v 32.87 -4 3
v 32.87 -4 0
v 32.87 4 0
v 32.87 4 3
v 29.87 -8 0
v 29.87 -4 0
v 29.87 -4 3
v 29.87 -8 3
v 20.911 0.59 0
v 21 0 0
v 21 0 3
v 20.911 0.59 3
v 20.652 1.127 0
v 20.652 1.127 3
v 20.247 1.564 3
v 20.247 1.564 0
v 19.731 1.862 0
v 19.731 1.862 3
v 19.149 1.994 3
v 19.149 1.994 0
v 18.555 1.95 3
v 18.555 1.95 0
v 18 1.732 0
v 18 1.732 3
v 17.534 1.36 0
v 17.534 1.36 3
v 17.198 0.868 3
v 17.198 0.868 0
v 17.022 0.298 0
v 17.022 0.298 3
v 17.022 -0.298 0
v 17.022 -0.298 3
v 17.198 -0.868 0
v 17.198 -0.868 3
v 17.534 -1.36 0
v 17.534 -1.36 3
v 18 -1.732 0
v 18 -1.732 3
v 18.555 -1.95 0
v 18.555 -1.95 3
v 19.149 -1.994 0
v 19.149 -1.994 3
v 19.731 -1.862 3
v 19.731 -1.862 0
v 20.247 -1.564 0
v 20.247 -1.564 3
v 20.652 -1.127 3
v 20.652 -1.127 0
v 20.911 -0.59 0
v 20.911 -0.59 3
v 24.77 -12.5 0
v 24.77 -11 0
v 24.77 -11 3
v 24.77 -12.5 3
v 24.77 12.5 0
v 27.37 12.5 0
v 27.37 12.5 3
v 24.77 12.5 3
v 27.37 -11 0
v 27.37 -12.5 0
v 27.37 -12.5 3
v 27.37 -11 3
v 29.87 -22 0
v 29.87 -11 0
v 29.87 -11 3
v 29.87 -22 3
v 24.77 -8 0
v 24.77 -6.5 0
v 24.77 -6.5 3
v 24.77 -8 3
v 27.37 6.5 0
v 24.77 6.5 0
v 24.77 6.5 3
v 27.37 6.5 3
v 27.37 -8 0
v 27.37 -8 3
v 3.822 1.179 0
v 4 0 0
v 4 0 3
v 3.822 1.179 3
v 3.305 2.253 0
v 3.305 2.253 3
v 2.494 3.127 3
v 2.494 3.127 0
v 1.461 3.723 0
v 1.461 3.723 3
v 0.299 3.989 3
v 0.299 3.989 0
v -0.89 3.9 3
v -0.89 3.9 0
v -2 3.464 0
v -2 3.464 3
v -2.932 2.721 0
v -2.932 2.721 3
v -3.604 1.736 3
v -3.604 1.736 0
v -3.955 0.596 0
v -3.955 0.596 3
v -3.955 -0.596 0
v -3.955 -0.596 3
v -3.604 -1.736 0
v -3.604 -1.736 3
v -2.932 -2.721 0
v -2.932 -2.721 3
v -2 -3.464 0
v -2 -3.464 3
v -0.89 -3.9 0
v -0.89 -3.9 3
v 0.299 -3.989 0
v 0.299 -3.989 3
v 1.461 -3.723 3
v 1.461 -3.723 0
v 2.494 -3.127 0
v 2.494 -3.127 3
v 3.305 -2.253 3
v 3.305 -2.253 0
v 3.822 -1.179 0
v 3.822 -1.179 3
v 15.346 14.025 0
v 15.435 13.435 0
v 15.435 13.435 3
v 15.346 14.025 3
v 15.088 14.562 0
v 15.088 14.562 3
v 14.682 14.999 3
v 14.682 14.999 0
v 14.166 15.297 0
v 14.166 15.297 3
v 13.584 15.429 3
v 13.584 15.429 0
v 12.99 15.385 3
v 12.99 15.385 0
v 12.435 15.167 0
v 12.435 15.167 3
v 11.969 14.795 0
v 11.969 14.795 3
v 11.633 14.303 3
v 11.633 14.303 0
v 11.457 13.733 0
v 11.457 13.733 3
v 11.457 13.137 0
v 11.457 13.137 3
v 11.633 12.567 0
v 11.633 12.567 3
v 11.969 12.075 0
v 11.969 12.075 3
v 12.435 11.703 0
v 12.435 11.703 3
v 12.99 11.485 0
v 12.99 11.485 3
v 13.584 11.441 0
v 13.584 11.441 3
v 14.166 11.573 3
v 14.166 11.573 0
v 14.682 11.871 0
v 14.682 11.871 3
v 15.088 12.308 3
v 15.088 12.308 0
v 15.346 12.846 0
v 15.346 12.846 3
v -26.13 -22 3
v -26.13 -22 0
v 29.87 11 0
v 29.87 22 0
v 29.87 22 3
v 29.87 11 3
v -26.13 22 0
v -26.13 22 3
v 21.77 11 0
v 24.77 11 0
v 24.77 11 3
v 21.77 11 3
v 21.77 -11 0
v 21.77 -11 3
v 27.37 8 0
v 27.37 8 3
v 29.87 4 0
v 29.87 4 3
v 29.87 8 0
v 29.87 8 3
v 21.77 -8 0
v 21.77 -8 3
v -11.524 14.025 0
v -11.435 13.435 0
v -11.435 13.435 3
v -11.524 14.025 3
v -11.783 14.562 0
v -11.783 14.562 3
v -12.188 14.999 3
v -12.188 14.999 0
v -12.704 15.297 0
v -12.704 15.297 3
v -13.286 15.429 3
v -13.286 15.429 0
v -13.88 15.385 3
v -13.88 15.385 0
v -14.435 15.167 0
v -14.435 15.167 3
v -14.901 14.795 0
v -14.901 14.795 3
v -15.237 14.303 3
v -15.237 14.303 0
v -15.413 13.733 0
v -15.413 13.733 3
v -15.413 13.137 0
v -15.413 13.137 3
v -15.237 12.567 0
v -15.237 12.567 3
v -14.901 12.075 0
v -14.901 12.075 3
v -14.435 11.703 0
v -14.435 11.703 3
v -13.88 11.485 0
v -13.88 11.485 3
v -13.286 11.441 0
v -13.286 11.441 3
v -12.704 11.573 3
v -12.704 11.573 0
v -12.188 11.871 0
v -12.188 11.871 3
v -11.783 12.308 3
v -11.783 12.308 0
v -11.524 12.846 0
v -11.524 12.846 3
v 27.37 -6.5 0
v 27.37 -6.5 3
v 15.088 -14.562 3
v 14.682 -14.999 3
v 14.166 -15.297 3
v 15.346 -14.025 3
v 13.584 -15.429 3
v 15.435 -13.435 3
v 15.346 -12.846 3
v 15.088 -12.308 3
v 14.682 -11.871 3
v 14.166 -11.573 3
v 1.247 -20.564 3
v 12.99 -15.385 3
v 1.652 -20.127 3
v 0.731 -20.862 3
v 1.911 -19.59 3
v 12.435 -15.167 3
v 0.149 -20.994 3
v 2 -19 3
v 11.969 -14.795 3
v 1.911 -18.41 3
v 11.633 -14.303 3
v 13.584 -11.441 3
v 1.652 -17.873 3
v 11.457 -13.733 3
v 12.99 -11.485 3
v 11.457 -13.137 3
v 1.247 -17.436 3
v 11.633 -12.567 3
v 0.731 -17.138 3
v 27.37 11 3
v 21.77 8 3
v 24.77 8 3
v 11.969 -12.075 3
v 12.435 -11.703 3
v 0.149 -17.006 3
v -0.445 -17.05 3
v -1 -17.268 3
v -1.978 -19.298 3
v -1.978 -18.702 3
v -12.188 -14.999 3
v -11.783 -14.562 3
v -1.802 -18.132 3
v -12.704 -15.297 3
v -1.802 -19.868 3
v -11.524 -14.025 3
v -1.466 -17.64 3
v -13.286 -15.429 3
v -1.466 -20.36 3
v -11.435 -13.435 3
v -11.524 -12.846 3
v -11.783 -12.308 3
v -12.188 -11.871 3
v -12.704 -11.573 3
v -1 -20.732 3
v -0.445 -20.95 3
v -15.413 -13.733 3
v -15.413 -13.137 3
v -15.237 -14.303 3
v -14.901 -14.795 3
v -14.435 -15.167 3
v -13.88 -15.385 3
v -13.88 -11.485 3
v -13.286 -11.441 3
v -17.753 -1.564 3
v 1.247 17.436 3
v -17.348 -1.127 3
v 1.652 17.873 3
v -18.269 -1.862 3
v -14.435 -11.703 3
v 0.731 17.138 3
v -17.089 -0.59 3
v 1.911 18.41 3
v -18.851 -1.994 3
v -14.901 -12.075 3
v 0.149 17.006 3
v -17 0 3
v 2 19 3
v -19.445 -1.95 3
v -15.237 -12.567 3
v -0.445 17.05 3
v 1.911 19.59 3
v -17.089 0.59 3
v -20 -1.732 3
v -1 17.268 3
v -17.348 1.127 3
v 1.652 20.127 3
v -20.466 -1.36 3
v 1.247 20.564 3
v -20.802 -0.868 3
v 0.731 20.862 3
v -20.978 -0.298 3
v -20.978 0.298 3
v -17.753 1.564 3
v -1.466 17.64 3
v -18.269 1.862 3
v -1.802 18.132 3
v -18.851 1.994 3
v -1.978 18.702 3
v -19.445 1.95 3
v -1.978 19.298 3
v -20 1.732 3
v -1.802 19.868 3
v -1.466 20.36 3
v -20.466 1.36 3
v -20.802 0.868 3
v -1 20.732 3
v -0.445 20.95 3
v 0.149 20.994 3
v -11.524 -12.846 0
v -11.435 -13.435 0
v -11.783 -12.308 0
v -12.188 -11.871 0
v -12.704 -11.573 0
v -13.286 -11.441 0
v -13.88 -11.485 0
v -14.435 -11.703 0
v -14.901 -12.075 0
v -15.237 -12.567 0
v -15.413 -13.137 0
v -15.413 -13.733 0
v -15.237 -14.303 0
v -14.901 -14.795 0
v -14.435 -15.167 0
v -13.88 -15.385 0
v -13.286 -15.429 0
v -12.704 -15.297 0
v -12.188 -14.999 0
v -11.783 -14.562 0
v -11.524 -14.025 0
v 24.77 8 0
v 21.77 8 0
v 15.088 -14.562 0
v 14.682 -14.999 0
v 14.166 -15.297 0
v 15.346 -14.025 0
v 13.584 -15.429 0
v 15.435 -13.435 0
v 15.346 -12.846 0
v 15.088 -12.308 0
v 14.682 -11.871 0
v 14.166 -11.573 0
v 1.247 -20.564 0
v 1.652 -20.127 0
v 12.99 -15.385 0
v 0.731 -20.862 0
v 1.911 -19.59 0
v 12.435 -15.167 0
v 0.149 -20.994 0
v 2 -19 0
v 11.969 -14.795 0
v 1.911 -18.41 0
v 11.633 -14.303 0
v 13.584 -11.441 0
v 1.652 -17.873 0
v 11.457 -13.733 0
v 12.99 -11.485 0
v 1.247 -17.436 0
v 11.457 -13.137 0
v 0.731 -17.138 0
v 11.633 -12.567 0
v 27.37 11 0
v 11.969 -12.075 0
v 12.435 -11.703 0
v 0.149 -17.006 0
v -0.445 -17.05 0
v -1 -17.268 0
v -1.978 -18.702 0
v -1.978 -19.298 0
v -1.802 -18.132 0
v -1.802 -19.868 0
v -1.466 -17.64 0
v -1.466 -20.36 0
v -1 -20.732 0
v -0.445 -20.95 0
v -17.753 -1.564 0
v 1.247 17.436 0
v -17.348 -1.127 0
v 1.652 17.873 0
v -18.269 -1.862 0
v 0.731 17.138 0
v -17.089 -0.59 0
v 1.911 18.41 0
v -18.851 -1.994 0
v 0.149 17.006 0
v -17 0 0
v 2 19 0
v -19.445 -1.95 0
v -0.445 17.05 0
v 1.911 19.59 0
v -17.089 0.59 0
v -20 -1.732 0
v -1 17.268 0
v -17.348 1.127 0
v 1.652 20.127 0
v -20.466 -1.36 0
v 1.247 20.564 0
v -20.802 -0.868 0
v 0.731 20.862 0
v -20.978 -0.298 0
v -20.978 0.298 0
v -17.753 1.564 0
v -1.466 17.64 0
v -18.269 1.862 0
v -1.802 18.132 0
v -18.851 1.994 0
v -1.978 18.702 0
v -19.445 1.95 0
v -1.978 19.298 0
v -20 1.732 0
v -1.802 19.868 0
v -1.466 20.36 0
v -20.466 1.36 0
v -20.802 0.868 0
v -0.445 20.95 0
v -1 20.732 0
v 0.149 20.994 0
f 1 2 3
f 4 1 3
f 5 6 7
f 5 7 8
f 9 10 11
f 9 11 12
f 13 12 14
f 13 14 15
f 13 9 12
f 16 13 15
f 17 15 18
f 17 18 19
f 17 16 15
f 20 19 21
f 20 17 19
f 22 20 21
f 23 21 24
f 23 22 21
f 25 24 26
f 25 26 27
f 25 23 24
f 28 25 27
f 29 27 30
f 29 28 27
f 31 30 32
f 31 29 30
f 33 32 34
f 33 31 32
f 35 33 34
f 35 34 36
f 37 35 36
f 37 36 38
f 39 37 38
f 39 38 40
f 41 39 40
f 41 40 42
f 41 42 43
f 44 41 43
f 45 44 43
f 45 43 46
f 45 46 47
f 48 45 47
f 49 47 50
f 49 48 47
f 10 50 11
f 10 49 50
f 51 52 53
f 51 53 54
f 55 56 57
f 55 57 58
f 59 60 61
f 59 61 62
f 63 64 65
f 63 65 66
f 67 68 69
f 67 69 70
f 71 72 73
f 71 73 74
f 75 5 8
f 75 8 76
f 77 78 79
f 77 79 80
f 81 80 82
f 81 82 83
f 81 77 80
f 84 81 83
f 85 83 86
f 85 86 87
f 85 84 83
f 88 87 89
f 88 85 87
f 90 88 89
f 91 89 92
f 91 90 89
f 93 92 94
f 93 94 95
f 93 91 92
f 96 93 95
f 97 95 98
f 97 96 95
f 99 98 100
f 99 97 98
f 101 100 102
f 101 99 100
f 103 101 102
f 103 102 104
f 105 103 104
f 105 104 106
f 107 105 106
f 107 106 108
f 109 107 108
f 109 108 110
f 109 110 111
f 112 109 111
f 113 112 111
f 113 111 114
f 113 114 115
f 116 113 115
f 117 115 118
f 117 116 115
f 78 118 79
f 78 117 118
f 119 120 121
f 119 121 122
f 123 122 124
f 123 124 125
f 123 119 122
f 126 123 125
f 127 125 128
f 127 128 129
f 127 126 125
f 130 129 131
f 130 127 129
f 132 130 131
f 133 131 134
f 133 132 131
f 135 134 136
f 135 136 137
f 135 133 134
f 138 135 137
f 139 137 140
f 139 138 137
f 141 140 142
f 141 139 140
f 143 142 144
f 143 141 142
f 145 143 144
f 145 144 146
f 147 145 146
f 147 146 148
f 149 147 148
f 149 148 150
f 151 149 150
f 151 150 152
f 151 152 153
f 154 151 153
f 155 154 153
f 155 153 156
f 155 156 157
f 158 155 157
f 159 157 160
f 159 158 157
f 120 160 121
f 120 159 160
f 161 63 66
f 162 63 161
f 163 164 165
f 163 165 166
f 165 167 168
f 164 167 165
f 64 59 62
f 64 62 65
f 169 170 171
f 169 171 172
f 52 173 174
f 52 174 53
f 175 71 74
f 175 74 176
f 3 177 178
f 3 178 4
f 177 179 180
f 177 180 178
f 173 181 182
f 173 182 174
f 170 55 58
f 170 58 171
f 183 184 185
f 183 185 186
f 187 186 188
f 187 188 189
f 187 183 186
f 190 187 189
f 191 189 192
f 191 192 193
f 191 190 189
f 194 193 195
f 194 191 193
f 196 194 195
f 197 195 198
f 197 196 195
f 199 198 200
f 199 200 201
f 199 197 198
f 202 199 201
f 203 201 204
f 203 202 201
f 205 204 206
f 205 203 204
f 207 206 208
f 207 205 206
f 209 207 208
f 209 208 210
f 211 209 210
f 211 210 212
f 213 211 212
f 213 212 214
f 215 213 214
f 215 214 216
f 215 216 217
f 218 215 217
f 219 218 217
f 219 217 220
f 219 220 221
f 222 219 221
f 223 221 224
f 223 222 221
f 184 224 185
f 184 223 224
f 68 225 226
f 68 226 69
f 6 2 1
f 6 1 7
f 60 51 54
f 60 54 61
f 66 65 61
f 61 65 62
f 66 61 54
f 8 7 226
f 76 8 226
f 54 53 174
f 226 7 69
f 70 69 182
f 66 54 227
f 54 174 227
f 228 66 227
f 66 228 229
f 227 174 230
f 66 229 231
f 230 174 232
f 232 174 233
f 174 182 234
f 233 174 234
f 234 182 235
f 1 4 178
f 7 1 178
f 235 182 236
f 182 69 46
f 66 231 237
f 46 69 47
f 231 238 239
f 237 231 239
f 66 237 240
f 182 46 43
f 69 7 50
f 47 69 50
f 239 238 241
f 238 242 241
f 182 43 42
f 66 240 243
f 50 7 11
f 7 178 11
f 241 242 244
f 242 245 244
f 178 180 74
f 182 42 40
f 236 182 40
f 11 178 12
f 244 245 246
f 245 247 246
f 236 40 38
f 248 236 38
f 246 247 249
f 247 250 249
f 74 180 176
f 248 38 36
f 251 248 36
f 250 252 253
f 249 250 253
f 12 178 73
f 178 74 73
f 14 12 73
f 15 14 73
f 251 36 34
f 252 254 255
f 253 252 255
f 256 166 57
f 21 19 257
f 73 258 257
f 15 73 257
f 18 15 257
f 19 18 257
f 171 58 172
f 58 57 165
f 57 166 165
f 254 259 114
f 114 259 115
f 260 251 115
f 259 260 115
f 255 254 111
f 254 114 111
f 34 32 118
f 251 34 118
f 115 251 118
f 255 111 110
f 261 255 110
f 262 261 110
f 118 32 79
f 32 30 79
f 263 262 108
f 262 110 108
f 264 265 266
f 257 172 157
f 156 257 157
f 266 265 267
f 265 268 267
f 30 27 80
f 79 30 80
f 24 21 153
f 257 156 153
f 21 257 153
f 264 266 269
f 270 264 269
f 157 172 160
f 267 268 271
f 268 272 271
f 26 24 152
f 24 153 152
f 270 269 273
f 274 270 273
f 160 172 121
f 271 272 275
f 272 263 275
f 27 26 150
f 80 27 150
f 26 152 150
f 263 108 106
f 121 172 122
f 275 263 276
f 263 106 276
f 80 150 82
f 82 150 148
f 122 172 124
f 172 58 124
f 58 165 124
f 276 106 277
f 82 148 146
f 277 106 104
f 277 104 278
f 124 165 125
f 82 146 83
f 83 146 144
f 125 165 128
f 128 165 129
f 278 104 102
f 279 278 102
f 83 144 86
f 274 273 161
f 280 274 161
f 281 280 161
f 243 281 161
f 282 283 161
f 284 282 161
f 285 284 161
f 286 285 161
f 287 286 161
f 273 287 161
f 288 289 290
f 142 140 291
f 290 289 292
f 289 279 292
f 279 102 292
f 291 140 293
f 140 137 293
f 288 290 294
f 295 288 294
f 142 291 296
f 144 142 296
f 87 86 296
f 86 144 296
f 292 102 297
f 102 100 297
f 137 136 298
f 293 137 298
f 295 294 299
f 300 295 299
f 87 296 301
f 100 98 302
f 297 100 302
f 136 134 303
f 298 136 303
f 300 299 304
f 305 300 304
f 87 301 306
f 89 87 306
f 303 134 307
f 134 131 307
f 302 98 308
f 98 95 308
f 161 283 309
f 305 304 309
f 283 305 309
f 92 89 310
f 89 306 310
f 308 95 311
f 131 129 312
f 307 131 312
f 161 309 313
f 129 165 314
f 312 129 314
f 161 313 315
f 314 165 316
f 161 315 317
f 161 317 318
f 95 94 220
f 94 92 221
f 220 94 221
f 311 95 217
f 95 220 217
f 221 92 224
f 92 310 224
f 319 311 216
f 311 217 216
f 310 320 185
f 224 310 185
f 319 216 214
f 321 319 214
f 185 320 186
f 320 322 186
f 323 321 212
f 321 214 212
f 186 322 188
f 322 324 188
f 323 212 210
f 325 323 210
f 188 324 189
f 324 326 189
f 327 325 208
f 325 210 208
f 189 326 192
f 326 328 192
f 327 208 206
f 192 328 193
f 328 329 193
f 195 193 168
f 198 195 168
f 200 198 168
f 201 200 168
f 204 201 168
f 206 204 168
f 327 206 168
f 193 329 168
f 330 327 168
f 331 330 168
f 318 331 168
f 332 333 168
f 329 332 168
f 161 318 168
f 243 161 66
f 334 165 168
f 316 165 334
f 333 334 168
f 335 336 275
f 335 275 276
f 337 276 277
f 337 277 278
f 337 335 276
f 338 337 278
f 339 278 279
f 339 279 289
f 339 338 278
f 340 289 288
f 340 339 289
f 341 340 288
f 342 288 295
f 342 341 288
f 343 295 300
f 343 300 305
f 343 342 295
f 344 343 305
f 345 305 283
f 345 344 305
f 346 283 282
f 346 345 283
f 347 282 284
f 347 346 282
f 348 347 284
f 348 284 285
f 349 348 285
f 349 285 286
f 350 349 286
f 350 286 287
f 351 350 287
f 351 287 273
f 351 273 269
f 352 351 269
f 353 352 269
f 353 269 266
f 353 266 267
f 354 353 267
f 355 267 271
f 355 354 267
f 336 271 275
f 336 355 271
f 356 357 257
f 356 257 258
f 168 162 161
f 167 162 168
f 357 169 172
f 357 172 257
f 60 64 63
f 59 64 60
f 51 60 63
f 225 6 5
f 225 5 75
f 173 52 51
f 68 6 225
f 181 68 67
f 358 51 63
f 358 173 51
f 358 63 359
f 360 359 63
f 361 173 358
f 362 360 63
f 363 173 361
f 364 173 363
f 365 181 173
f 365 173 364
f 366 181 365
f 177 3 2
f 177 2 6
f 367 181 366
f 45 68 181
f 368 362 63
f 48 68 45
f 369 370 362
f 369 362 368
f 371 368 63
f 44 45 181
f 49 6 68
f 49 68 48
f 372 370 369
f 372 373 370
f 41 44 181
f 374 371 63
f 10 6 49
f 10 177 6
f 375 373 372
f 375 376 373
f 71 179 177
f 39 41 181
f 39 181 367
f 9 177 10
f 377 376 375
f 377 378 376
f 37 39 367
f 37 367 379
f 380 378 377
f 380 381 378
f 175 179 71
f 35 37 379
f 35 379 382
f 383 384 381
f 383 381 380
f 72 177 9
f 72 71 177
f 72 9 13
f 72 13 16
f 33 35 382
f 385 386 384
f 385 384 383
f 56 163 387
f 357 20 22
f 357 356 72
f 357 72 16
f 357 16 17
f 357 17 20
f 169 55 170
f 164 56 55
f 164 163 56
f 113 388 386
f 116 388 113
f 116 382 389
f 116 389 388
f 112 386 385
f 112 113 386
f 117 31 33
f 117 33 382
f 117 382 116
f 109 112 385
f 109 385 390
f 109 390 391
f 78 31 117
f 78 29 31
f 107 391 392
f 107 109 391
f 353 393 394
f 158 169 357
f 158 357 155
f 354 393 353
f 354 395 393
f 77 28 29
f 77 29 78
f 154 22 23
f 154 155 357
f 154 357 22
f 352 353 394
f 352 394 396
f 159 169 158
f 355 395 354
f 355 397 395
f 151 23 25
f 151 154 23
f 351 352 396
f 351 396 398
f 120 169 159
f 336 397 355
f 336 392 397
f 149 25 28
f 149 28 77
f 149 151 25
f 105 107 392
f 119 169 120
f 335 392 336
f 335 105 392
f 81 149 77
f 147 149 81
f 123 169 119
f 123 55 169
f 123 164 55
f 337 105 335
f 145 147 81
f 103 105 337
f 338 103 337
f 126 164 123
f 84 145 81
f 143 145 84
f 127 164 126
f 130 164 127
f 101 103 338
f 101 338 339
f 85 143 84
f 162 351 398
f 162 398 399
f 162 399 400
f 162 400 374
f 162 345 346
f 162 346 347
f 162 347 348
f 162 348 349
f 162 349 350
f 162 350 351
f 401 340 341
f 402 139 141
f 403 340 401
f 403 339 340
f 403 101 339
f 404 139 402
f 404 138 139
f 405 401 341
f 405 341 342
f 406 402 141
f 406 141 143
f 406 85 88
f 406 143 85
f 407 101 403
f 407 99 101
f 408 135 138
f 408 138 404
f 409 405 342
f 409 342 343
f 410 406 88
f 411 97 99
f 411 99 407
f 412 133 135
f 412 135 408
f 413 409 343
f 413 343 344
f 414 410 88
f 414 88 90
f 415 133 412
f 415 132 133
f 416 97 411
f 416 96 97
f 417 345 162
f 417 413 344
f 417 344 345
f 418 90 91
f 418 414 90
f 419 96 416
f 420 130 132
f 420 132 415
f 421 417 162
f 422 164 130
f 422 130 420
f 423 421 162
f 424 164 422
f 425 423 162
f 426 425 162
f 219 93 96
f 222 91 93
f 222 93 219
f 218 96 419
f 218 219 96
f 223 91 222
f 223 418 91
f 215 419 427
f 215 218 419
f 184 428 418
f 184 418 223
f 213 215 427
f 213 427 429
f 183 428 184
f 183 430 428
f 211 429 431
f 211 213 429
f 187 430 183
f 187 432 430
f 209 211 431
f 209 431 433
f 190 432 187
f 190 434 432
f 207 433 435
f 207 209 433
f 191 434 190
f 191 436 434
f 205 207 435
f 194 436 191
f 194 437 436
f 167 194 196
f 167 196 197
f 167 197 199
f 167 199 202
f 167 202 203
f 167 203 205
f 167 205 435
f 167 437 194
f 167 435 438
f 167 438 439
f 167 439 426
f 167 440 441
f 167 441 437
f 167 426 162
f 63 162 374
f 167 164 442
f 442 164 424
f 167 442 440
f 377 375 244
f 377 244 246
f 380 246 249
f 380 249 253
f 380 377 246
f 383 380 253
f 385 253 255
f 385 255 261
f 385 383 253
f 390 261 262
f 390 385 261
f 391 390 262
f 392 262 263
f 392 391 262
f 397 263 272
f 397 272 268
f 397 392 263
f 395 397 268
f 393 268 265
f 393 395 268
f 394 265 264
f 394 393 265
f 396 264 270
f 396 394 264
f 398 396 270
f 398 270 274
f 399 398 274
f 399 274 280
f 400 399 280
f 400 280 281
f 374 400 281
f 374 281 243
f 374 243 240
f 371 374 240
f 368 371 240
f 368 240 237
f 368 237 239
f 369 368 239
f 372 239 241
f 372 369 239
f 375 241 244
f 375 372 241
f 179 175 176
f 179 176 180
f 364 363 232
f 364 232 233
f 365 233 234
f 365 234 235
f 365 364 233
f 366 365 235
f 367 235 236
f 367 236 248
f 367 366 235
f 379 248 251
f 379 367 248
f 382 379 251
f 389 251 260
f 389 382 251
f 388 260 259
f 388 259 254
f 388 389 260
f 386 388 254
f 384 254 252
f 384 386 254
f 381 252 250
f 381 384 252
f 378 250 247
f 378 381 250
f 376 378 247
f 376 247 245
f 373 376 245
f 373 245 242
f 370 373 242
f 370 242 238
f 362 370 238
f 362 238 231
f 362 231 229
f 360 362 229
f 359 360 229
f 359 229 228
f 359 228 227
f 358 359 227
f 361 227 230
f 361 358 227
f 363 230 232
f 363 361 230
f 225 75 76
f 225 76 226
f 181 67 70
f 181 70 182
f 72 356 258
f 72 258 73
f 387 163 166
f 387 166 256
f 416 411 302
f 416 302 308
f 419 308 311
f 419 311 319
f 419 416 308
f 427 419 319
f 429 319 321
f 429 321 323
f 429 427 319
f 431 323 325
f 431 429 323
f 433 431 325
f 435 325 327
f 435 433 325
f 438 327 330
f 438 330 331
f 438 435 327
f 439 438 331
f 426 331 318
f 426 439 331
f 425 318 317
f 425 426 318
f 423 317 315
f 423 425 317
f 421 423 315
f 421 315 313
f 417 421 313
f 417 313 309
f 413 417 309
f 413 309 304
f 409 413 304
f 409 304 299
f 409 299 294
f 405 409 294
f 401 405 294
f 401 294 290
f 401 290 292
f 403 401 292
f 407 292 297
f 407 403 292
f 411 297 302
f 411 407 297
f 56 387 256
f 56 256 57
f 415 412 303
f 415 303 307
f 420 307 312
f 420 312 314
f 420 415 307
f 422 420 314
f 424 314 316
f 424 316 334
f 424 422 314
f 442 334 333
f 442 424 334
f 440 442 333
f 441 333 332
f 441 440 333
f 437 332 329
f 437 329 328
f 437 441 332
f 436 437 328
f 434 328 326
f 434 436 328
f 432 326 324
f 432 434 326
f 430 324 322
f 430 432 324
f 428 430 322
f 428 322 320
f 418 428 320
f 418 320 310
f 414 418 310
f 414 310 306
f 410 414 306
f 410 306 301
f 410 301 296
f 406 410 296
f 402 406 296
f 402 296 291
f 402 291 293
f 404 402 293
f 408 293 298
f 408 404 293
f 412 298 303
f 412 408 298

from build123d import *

# Parameters (mm, degrees)
SKETCH_1_R      = 4
SKETCH_1_R_2    = 2
EXTRUDE_1_DEPTH = 3


with BuildPart() as part:
    # 草图1 → 凸台-拉伸1 (new body)
    with BuildSketch(Plane.XY):
        Polygon((27.370057685, 11), (27.370057685, 12.5), (24.770057685, 12.5), (24.770057685, 11), (21.770057685, 11), (21.770057685, 8), (24.770057685, 8), (24.770057685, 6.5), (27.370057685, 6.5), (27.370057685, 8), (29.870057685, 8), (29.870057685, 4), (32.870057685, 4), (32.870057685, 0), (32.870057685, -4), (29.870057685, -4), (29.870057685, -8), (27.370057685, -8), (27.370057685, -6.5), (24.770057685, -6.5), (24.770057685, -8), (21.770057685, -8), (21.770057685, -11), (24.770057685, -11), (24.770057685, -12.5), (27.370057685, -12.5), (27.370057685, -11), (29.870057685, -11), (29.870057685, -22), (-26.129942315, -22), (-26.129942315, 22), (29.870057685, 22), (29.870057685, 11), align=None)
        Circle(SKETCH_1_R, mode=Mode.SUBTRACT)
        with Locations((0, -19)):
            Circle(SKETCH_1_R_2, mode=Mode.SUBTRACT)
        with Locations((-13.435028843, -13.435028843)):
            Circle(SKETCH_1_R_2, mode=Mode.SUBTRACT)
        with Locations((-19, 0)):
            Circle(SKETCH_1_R_2, mode=Mode.SUBTRACT)
        with Locations((-13.435028843, 13.435028843)):
            Circle(SKETCH_1_R_2, mode=Mode.SUBTRACT)
        with Locations((0, 19)):
            Circle(SKETCH_1_R_2, mode=Mode.SUBTRACT)
        with Locations((13.435028843, 13.435028843)):
            Circle(SKETCH_1_R_2, mode=Mode.SUBTRACT)
        with Locations((19, 0)):
            Circle(SKETCH_1_R_2, mode=Mode.SUBTRACT)
        with Locations((13.435028843, -13.435028843)):
            Circle(SKETCH_1_R_2, mode=Mode.SUBTRACT)
    extrude(amount=EXTRUDE_1_DEPTH)


solid = part.part
